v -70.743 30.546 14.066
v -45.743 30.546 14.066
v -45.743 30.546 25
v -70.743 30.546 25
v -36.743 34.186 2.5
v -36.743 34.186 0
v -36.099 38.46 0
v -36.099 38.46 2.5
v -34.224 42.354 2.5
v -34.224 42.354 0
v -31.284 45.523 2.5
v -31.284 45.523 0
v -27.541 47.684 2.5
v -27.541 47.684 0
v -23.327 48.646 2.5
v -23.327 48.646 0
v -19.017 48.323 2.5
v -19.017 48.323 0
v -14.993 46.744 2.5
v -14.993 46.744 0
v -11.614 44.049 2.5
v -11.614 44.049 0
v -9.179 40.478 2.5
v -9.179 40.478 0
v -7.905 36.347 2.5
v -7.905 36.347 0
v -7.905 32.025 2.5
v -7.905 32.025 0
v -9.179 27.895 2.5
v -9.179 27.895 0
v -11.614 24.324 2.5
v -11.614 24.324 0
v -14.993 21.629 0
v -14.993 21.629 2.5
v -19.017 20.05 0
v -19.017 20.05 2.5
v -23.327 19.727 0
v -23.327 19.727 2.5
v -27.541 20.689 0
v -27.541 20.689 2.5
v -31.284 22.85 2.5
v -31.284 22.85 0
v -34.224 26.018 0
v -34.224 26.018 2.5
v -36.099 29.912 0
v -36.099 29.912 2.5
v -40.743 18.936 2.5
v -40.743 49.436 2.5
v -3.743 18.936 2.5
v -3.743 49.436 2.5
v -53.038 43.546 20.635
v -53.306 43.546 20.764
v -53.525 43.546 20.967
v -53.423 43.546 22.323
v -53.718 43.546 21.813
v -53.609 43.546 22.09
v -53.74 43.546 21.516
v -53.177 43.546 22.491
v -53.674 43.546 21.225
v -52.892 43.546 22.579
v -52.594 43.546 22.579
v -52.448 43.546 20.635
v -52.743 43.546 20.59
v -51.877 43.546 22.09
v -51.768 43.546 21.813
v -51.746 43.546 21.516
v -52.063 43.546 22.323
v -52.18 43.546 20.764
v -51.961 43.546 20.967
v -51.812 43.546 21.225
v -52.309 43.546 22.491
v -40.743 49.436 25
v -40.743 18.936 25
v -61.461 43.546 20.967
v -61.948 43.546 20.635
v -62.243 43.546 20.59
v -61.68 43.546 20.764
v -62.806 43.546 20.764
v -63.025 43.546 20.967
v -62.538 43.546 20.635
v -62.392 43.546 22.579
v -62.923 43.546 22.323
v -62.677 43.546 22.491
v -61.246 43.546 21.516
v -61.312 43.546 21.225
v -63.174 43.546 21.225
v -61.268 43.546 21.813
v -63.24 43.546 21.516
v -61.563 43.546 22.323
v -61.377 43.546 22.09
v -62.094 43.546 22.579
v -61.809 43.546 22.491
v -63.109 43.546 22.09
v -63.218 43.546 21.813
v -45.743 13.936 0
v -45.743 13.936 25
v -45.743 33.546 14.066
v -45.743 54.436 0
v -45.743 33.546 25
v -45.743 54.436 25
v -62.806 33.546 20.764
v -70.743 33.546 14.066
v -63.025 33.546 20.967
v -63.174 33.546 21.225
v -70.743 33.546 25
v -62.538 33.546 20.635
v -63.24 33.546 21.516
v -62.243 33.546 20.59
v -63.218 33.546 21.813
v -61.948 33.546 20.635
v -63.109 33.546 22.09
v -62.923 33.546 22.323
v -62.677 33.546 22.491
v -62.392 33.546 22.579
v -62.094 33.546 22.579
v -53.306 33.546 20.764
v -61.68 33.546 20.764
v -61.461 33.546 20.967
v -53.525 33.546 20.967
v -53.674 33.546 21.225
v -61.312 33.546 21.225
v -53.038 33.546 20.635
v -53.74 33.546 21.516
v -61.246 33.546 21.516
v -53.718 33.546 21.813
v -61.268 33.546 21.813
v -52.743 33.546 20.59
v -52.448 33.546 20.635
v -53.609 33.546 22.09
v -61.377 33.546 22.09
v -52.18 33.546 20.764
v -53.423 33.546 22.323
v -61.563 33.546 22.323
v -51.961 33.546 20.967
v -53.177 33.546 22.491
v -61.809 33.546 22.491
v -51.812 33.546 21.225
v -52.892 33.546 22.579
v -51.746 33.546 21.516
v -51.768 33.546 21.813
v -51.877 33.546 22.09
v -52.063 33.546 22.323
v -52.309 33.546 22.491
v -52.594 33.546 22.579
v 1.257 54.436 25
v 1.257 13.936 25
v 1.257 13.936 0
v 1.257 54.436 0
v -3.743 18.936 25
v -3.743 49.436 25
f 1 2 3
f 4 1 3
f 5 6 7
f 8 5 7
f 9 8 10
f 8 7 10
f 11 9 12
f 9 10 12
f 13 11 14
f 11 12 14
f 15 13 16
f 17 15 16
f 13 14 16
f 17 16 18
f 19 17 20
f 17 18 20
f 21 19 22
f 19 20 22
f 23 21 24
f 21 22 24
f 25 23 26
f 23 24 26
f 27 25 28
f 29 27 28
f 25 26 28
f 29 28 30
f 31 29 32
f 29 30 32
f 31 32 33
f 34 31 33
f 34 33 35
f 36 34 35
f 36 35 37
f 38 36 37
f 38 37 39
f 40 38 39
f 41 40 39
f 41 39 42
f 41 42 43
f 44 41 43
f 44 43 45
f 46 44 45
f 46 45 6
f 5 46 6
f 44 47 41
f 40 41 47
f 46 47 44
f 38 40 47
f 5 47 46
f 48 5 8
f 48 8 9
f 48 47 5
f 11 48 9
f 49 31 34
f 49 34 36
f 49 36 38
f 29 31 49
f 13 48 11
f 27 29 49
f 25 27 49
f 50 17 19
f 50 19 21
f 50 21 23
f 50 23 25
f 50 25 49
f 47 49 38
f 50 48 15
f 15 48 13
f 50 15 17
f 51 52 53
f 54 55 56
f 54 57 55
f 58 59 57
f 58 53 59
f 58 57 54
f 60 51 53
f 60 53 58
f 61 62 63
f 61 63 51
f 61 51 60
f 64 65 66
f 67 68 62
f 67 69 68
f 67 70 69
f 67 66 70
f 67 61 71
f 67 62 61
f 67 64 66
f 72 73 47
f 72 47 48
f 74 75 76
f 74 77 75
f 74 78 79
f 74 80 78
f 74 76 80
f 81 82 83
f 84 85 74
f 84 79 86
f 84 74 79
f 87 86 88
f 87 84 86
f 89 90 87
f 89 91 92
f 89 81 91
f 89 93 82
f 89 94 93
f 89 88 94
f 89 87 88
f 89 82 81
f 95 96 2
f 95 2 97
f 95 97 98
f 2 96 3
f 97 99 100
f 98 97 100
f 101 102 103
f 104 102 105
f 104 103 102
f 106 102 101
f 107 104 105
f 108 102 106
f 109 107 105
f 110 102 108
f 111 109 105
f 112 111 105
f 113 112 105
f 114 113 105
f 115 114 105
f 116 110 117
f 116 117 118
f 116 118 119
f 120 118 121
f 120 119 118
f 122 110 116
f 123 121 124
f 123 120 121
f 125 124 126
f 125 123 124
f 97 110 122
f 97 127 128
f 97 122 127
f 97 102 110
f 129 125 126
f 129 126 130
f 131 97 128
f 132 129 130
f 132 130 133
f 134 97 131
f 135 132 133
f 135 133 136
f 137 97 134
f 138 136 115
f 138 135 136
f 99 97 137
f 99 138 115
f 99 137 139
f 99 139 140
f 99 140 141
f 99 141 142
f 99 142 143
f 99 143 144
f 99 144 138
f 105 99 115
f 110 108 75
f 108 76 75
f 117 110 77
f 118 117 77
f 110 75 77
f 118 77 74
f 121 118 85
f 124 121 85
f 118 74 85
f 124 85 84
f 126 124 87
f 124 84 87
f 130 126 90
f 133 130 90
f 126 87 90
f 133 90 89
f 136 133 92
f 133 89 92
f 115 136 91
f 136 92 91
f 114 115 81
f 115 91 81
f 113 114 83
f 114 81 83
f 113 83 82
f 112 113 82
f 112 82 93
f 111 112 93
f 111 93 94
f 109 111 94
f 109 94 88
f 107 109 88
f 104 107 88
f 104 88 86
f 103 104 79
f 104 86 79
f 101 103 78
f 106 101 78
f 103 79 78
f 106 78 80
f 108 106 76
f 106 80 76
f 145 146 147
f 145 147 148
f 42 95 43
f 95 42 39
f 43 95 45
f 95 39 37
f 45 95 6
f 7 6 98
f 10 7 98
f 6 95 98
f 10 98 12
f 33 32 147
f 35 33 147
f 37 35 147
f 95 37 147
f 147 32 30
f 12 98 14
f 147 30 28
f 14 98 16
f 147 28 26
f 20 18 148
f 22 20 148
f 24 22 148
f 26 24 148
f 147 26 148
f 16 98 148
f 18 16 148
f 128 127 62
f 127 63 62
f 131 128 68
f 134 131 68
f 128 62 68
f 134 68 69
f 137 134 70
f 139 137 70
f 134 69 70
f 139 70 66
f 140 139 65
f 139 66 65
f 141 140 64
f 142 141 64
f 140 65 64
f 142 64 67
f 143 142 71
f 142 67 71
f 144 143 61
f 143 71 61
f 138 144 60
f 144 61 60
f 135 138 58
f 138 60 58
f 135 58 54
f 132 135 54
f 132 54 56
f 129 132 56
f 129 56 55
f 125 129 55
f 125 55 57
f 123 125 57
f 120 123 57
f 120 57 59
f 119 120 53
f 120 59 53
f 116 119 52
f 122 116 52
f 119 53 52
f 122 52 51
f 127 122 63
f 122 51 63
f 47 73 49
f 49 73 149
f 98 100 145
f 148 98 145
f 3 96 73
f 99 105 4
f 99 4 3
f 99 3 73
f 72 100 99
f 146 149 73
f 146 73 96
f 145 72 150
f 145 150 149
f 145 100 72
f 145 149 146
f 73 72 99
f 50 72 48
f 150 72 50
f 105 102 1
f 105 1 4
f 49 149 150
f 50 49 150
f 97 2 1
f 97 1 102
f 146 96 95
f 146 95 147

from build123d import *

# Parameters (mm, degrees)
CROQUIS1_W                    = 47
CROQUIS1_H                    = 40.5
SALIENTE_EXTRUIR1_DEPTH       = 25
CROQUIS2_W                    = 10.933851529
CROQUIS2_H                    = 3
SALIENTE_EXTRUIR2_DEPTH       = 25
CROQUIS3_W                    = 37
CROQUIS3_H                    = 30.5
CORTAR_EXTRUIR1_DEPTH         = 22.5
CROQUIS4_W                    = 1
CROQUIS4_H                    = 10
CROQUIS5_W                    = 1
CROQUIS5_H                    = 10
TALADRO_DE_MARGEN_PARA_M251_D = 29


with BuildPart() as part:
    # Croquis1 → Saliente-Extruir1 (new body)
    with BuildSketch(Plane.XY.offset(25)):
        with Locations((-22.24307249, 34.18630066)):
            Rectangle(CROQUIS1_W, CROQUIS1_H)
    extrude(amount=-SALIENTE_EXTRUIR1_DEPTH)

    # Croquis2 → Saliente-Extruir2 (add)
    with BuildSketch(Plane.ZY.offset(45.74307249)):
        with Locations((19.533074236, 32.04630066)):
            Rectangle(CROQUIS2_W, CROQUIS2_H)
    extrude(amount=SALIENTE_EXTRUIR2_DEPTH)

    # Croquis3 → Cortar-Extruir1 (cut)
    with BuildSketch(Plane.XY.offset(25)):
        with Locations((-22.24307249, 34.18630066)):
            Rectangle(CROQUIS3_W, CROQUIS3_H)
    extrude(amount=-CORTAR_EXTRUIR1_DEPTH, mode=Mode.SUBTRACT)

    # Croquis4 → Revolución1 (revolve)
    with BuildSketch(Plane.XY.offset(21.590447053), mode=Mode.PRIVATE) as revoluci_n1_sk:
        with Locations((-52.24307249, 38.54630066)):
            Rectangle(CROQUIS4_W, CROQUIS4_H)
    revolve(revoluci_n1_sk.sketch.rotate(Axis((-52.74307249, 43.54630066, 21.590447053), (0, -1, 0)), 270), axis=Axis((-52.74307249, 43.54630066, 21.590447053), (0, -1, 0)))

    # Croquis5 → Revolución2 (revolve)
    with BuildSketch(Plane.XY.offset(21.590447053), mode=Mode.PRIVATE) as revoluci_n2_sk:
        with Locations((-61.74307249, 38.54630066)):
            Rectangle(CROQUIS5_W, CROQUIS5_H)
    revolve(revoluci_n2_sk.sketch.rotate(Axis((-62.24307249, 43.54630066, 21.590447053), (0, -1, 0)), 270), axis=Axis((-62.24307249, 43.54630066, 21.590447053), (0, -1, 0)))

    # Taladro de margen para M251 (through all)
    with Locations(Plane.XY.offset(2.5)):
        with Locations((-22.24307249, 34.18630066)):
            Hole(TALADRO_DE_MARGEN_PARA_M251_D / 2)


solid = part.part
